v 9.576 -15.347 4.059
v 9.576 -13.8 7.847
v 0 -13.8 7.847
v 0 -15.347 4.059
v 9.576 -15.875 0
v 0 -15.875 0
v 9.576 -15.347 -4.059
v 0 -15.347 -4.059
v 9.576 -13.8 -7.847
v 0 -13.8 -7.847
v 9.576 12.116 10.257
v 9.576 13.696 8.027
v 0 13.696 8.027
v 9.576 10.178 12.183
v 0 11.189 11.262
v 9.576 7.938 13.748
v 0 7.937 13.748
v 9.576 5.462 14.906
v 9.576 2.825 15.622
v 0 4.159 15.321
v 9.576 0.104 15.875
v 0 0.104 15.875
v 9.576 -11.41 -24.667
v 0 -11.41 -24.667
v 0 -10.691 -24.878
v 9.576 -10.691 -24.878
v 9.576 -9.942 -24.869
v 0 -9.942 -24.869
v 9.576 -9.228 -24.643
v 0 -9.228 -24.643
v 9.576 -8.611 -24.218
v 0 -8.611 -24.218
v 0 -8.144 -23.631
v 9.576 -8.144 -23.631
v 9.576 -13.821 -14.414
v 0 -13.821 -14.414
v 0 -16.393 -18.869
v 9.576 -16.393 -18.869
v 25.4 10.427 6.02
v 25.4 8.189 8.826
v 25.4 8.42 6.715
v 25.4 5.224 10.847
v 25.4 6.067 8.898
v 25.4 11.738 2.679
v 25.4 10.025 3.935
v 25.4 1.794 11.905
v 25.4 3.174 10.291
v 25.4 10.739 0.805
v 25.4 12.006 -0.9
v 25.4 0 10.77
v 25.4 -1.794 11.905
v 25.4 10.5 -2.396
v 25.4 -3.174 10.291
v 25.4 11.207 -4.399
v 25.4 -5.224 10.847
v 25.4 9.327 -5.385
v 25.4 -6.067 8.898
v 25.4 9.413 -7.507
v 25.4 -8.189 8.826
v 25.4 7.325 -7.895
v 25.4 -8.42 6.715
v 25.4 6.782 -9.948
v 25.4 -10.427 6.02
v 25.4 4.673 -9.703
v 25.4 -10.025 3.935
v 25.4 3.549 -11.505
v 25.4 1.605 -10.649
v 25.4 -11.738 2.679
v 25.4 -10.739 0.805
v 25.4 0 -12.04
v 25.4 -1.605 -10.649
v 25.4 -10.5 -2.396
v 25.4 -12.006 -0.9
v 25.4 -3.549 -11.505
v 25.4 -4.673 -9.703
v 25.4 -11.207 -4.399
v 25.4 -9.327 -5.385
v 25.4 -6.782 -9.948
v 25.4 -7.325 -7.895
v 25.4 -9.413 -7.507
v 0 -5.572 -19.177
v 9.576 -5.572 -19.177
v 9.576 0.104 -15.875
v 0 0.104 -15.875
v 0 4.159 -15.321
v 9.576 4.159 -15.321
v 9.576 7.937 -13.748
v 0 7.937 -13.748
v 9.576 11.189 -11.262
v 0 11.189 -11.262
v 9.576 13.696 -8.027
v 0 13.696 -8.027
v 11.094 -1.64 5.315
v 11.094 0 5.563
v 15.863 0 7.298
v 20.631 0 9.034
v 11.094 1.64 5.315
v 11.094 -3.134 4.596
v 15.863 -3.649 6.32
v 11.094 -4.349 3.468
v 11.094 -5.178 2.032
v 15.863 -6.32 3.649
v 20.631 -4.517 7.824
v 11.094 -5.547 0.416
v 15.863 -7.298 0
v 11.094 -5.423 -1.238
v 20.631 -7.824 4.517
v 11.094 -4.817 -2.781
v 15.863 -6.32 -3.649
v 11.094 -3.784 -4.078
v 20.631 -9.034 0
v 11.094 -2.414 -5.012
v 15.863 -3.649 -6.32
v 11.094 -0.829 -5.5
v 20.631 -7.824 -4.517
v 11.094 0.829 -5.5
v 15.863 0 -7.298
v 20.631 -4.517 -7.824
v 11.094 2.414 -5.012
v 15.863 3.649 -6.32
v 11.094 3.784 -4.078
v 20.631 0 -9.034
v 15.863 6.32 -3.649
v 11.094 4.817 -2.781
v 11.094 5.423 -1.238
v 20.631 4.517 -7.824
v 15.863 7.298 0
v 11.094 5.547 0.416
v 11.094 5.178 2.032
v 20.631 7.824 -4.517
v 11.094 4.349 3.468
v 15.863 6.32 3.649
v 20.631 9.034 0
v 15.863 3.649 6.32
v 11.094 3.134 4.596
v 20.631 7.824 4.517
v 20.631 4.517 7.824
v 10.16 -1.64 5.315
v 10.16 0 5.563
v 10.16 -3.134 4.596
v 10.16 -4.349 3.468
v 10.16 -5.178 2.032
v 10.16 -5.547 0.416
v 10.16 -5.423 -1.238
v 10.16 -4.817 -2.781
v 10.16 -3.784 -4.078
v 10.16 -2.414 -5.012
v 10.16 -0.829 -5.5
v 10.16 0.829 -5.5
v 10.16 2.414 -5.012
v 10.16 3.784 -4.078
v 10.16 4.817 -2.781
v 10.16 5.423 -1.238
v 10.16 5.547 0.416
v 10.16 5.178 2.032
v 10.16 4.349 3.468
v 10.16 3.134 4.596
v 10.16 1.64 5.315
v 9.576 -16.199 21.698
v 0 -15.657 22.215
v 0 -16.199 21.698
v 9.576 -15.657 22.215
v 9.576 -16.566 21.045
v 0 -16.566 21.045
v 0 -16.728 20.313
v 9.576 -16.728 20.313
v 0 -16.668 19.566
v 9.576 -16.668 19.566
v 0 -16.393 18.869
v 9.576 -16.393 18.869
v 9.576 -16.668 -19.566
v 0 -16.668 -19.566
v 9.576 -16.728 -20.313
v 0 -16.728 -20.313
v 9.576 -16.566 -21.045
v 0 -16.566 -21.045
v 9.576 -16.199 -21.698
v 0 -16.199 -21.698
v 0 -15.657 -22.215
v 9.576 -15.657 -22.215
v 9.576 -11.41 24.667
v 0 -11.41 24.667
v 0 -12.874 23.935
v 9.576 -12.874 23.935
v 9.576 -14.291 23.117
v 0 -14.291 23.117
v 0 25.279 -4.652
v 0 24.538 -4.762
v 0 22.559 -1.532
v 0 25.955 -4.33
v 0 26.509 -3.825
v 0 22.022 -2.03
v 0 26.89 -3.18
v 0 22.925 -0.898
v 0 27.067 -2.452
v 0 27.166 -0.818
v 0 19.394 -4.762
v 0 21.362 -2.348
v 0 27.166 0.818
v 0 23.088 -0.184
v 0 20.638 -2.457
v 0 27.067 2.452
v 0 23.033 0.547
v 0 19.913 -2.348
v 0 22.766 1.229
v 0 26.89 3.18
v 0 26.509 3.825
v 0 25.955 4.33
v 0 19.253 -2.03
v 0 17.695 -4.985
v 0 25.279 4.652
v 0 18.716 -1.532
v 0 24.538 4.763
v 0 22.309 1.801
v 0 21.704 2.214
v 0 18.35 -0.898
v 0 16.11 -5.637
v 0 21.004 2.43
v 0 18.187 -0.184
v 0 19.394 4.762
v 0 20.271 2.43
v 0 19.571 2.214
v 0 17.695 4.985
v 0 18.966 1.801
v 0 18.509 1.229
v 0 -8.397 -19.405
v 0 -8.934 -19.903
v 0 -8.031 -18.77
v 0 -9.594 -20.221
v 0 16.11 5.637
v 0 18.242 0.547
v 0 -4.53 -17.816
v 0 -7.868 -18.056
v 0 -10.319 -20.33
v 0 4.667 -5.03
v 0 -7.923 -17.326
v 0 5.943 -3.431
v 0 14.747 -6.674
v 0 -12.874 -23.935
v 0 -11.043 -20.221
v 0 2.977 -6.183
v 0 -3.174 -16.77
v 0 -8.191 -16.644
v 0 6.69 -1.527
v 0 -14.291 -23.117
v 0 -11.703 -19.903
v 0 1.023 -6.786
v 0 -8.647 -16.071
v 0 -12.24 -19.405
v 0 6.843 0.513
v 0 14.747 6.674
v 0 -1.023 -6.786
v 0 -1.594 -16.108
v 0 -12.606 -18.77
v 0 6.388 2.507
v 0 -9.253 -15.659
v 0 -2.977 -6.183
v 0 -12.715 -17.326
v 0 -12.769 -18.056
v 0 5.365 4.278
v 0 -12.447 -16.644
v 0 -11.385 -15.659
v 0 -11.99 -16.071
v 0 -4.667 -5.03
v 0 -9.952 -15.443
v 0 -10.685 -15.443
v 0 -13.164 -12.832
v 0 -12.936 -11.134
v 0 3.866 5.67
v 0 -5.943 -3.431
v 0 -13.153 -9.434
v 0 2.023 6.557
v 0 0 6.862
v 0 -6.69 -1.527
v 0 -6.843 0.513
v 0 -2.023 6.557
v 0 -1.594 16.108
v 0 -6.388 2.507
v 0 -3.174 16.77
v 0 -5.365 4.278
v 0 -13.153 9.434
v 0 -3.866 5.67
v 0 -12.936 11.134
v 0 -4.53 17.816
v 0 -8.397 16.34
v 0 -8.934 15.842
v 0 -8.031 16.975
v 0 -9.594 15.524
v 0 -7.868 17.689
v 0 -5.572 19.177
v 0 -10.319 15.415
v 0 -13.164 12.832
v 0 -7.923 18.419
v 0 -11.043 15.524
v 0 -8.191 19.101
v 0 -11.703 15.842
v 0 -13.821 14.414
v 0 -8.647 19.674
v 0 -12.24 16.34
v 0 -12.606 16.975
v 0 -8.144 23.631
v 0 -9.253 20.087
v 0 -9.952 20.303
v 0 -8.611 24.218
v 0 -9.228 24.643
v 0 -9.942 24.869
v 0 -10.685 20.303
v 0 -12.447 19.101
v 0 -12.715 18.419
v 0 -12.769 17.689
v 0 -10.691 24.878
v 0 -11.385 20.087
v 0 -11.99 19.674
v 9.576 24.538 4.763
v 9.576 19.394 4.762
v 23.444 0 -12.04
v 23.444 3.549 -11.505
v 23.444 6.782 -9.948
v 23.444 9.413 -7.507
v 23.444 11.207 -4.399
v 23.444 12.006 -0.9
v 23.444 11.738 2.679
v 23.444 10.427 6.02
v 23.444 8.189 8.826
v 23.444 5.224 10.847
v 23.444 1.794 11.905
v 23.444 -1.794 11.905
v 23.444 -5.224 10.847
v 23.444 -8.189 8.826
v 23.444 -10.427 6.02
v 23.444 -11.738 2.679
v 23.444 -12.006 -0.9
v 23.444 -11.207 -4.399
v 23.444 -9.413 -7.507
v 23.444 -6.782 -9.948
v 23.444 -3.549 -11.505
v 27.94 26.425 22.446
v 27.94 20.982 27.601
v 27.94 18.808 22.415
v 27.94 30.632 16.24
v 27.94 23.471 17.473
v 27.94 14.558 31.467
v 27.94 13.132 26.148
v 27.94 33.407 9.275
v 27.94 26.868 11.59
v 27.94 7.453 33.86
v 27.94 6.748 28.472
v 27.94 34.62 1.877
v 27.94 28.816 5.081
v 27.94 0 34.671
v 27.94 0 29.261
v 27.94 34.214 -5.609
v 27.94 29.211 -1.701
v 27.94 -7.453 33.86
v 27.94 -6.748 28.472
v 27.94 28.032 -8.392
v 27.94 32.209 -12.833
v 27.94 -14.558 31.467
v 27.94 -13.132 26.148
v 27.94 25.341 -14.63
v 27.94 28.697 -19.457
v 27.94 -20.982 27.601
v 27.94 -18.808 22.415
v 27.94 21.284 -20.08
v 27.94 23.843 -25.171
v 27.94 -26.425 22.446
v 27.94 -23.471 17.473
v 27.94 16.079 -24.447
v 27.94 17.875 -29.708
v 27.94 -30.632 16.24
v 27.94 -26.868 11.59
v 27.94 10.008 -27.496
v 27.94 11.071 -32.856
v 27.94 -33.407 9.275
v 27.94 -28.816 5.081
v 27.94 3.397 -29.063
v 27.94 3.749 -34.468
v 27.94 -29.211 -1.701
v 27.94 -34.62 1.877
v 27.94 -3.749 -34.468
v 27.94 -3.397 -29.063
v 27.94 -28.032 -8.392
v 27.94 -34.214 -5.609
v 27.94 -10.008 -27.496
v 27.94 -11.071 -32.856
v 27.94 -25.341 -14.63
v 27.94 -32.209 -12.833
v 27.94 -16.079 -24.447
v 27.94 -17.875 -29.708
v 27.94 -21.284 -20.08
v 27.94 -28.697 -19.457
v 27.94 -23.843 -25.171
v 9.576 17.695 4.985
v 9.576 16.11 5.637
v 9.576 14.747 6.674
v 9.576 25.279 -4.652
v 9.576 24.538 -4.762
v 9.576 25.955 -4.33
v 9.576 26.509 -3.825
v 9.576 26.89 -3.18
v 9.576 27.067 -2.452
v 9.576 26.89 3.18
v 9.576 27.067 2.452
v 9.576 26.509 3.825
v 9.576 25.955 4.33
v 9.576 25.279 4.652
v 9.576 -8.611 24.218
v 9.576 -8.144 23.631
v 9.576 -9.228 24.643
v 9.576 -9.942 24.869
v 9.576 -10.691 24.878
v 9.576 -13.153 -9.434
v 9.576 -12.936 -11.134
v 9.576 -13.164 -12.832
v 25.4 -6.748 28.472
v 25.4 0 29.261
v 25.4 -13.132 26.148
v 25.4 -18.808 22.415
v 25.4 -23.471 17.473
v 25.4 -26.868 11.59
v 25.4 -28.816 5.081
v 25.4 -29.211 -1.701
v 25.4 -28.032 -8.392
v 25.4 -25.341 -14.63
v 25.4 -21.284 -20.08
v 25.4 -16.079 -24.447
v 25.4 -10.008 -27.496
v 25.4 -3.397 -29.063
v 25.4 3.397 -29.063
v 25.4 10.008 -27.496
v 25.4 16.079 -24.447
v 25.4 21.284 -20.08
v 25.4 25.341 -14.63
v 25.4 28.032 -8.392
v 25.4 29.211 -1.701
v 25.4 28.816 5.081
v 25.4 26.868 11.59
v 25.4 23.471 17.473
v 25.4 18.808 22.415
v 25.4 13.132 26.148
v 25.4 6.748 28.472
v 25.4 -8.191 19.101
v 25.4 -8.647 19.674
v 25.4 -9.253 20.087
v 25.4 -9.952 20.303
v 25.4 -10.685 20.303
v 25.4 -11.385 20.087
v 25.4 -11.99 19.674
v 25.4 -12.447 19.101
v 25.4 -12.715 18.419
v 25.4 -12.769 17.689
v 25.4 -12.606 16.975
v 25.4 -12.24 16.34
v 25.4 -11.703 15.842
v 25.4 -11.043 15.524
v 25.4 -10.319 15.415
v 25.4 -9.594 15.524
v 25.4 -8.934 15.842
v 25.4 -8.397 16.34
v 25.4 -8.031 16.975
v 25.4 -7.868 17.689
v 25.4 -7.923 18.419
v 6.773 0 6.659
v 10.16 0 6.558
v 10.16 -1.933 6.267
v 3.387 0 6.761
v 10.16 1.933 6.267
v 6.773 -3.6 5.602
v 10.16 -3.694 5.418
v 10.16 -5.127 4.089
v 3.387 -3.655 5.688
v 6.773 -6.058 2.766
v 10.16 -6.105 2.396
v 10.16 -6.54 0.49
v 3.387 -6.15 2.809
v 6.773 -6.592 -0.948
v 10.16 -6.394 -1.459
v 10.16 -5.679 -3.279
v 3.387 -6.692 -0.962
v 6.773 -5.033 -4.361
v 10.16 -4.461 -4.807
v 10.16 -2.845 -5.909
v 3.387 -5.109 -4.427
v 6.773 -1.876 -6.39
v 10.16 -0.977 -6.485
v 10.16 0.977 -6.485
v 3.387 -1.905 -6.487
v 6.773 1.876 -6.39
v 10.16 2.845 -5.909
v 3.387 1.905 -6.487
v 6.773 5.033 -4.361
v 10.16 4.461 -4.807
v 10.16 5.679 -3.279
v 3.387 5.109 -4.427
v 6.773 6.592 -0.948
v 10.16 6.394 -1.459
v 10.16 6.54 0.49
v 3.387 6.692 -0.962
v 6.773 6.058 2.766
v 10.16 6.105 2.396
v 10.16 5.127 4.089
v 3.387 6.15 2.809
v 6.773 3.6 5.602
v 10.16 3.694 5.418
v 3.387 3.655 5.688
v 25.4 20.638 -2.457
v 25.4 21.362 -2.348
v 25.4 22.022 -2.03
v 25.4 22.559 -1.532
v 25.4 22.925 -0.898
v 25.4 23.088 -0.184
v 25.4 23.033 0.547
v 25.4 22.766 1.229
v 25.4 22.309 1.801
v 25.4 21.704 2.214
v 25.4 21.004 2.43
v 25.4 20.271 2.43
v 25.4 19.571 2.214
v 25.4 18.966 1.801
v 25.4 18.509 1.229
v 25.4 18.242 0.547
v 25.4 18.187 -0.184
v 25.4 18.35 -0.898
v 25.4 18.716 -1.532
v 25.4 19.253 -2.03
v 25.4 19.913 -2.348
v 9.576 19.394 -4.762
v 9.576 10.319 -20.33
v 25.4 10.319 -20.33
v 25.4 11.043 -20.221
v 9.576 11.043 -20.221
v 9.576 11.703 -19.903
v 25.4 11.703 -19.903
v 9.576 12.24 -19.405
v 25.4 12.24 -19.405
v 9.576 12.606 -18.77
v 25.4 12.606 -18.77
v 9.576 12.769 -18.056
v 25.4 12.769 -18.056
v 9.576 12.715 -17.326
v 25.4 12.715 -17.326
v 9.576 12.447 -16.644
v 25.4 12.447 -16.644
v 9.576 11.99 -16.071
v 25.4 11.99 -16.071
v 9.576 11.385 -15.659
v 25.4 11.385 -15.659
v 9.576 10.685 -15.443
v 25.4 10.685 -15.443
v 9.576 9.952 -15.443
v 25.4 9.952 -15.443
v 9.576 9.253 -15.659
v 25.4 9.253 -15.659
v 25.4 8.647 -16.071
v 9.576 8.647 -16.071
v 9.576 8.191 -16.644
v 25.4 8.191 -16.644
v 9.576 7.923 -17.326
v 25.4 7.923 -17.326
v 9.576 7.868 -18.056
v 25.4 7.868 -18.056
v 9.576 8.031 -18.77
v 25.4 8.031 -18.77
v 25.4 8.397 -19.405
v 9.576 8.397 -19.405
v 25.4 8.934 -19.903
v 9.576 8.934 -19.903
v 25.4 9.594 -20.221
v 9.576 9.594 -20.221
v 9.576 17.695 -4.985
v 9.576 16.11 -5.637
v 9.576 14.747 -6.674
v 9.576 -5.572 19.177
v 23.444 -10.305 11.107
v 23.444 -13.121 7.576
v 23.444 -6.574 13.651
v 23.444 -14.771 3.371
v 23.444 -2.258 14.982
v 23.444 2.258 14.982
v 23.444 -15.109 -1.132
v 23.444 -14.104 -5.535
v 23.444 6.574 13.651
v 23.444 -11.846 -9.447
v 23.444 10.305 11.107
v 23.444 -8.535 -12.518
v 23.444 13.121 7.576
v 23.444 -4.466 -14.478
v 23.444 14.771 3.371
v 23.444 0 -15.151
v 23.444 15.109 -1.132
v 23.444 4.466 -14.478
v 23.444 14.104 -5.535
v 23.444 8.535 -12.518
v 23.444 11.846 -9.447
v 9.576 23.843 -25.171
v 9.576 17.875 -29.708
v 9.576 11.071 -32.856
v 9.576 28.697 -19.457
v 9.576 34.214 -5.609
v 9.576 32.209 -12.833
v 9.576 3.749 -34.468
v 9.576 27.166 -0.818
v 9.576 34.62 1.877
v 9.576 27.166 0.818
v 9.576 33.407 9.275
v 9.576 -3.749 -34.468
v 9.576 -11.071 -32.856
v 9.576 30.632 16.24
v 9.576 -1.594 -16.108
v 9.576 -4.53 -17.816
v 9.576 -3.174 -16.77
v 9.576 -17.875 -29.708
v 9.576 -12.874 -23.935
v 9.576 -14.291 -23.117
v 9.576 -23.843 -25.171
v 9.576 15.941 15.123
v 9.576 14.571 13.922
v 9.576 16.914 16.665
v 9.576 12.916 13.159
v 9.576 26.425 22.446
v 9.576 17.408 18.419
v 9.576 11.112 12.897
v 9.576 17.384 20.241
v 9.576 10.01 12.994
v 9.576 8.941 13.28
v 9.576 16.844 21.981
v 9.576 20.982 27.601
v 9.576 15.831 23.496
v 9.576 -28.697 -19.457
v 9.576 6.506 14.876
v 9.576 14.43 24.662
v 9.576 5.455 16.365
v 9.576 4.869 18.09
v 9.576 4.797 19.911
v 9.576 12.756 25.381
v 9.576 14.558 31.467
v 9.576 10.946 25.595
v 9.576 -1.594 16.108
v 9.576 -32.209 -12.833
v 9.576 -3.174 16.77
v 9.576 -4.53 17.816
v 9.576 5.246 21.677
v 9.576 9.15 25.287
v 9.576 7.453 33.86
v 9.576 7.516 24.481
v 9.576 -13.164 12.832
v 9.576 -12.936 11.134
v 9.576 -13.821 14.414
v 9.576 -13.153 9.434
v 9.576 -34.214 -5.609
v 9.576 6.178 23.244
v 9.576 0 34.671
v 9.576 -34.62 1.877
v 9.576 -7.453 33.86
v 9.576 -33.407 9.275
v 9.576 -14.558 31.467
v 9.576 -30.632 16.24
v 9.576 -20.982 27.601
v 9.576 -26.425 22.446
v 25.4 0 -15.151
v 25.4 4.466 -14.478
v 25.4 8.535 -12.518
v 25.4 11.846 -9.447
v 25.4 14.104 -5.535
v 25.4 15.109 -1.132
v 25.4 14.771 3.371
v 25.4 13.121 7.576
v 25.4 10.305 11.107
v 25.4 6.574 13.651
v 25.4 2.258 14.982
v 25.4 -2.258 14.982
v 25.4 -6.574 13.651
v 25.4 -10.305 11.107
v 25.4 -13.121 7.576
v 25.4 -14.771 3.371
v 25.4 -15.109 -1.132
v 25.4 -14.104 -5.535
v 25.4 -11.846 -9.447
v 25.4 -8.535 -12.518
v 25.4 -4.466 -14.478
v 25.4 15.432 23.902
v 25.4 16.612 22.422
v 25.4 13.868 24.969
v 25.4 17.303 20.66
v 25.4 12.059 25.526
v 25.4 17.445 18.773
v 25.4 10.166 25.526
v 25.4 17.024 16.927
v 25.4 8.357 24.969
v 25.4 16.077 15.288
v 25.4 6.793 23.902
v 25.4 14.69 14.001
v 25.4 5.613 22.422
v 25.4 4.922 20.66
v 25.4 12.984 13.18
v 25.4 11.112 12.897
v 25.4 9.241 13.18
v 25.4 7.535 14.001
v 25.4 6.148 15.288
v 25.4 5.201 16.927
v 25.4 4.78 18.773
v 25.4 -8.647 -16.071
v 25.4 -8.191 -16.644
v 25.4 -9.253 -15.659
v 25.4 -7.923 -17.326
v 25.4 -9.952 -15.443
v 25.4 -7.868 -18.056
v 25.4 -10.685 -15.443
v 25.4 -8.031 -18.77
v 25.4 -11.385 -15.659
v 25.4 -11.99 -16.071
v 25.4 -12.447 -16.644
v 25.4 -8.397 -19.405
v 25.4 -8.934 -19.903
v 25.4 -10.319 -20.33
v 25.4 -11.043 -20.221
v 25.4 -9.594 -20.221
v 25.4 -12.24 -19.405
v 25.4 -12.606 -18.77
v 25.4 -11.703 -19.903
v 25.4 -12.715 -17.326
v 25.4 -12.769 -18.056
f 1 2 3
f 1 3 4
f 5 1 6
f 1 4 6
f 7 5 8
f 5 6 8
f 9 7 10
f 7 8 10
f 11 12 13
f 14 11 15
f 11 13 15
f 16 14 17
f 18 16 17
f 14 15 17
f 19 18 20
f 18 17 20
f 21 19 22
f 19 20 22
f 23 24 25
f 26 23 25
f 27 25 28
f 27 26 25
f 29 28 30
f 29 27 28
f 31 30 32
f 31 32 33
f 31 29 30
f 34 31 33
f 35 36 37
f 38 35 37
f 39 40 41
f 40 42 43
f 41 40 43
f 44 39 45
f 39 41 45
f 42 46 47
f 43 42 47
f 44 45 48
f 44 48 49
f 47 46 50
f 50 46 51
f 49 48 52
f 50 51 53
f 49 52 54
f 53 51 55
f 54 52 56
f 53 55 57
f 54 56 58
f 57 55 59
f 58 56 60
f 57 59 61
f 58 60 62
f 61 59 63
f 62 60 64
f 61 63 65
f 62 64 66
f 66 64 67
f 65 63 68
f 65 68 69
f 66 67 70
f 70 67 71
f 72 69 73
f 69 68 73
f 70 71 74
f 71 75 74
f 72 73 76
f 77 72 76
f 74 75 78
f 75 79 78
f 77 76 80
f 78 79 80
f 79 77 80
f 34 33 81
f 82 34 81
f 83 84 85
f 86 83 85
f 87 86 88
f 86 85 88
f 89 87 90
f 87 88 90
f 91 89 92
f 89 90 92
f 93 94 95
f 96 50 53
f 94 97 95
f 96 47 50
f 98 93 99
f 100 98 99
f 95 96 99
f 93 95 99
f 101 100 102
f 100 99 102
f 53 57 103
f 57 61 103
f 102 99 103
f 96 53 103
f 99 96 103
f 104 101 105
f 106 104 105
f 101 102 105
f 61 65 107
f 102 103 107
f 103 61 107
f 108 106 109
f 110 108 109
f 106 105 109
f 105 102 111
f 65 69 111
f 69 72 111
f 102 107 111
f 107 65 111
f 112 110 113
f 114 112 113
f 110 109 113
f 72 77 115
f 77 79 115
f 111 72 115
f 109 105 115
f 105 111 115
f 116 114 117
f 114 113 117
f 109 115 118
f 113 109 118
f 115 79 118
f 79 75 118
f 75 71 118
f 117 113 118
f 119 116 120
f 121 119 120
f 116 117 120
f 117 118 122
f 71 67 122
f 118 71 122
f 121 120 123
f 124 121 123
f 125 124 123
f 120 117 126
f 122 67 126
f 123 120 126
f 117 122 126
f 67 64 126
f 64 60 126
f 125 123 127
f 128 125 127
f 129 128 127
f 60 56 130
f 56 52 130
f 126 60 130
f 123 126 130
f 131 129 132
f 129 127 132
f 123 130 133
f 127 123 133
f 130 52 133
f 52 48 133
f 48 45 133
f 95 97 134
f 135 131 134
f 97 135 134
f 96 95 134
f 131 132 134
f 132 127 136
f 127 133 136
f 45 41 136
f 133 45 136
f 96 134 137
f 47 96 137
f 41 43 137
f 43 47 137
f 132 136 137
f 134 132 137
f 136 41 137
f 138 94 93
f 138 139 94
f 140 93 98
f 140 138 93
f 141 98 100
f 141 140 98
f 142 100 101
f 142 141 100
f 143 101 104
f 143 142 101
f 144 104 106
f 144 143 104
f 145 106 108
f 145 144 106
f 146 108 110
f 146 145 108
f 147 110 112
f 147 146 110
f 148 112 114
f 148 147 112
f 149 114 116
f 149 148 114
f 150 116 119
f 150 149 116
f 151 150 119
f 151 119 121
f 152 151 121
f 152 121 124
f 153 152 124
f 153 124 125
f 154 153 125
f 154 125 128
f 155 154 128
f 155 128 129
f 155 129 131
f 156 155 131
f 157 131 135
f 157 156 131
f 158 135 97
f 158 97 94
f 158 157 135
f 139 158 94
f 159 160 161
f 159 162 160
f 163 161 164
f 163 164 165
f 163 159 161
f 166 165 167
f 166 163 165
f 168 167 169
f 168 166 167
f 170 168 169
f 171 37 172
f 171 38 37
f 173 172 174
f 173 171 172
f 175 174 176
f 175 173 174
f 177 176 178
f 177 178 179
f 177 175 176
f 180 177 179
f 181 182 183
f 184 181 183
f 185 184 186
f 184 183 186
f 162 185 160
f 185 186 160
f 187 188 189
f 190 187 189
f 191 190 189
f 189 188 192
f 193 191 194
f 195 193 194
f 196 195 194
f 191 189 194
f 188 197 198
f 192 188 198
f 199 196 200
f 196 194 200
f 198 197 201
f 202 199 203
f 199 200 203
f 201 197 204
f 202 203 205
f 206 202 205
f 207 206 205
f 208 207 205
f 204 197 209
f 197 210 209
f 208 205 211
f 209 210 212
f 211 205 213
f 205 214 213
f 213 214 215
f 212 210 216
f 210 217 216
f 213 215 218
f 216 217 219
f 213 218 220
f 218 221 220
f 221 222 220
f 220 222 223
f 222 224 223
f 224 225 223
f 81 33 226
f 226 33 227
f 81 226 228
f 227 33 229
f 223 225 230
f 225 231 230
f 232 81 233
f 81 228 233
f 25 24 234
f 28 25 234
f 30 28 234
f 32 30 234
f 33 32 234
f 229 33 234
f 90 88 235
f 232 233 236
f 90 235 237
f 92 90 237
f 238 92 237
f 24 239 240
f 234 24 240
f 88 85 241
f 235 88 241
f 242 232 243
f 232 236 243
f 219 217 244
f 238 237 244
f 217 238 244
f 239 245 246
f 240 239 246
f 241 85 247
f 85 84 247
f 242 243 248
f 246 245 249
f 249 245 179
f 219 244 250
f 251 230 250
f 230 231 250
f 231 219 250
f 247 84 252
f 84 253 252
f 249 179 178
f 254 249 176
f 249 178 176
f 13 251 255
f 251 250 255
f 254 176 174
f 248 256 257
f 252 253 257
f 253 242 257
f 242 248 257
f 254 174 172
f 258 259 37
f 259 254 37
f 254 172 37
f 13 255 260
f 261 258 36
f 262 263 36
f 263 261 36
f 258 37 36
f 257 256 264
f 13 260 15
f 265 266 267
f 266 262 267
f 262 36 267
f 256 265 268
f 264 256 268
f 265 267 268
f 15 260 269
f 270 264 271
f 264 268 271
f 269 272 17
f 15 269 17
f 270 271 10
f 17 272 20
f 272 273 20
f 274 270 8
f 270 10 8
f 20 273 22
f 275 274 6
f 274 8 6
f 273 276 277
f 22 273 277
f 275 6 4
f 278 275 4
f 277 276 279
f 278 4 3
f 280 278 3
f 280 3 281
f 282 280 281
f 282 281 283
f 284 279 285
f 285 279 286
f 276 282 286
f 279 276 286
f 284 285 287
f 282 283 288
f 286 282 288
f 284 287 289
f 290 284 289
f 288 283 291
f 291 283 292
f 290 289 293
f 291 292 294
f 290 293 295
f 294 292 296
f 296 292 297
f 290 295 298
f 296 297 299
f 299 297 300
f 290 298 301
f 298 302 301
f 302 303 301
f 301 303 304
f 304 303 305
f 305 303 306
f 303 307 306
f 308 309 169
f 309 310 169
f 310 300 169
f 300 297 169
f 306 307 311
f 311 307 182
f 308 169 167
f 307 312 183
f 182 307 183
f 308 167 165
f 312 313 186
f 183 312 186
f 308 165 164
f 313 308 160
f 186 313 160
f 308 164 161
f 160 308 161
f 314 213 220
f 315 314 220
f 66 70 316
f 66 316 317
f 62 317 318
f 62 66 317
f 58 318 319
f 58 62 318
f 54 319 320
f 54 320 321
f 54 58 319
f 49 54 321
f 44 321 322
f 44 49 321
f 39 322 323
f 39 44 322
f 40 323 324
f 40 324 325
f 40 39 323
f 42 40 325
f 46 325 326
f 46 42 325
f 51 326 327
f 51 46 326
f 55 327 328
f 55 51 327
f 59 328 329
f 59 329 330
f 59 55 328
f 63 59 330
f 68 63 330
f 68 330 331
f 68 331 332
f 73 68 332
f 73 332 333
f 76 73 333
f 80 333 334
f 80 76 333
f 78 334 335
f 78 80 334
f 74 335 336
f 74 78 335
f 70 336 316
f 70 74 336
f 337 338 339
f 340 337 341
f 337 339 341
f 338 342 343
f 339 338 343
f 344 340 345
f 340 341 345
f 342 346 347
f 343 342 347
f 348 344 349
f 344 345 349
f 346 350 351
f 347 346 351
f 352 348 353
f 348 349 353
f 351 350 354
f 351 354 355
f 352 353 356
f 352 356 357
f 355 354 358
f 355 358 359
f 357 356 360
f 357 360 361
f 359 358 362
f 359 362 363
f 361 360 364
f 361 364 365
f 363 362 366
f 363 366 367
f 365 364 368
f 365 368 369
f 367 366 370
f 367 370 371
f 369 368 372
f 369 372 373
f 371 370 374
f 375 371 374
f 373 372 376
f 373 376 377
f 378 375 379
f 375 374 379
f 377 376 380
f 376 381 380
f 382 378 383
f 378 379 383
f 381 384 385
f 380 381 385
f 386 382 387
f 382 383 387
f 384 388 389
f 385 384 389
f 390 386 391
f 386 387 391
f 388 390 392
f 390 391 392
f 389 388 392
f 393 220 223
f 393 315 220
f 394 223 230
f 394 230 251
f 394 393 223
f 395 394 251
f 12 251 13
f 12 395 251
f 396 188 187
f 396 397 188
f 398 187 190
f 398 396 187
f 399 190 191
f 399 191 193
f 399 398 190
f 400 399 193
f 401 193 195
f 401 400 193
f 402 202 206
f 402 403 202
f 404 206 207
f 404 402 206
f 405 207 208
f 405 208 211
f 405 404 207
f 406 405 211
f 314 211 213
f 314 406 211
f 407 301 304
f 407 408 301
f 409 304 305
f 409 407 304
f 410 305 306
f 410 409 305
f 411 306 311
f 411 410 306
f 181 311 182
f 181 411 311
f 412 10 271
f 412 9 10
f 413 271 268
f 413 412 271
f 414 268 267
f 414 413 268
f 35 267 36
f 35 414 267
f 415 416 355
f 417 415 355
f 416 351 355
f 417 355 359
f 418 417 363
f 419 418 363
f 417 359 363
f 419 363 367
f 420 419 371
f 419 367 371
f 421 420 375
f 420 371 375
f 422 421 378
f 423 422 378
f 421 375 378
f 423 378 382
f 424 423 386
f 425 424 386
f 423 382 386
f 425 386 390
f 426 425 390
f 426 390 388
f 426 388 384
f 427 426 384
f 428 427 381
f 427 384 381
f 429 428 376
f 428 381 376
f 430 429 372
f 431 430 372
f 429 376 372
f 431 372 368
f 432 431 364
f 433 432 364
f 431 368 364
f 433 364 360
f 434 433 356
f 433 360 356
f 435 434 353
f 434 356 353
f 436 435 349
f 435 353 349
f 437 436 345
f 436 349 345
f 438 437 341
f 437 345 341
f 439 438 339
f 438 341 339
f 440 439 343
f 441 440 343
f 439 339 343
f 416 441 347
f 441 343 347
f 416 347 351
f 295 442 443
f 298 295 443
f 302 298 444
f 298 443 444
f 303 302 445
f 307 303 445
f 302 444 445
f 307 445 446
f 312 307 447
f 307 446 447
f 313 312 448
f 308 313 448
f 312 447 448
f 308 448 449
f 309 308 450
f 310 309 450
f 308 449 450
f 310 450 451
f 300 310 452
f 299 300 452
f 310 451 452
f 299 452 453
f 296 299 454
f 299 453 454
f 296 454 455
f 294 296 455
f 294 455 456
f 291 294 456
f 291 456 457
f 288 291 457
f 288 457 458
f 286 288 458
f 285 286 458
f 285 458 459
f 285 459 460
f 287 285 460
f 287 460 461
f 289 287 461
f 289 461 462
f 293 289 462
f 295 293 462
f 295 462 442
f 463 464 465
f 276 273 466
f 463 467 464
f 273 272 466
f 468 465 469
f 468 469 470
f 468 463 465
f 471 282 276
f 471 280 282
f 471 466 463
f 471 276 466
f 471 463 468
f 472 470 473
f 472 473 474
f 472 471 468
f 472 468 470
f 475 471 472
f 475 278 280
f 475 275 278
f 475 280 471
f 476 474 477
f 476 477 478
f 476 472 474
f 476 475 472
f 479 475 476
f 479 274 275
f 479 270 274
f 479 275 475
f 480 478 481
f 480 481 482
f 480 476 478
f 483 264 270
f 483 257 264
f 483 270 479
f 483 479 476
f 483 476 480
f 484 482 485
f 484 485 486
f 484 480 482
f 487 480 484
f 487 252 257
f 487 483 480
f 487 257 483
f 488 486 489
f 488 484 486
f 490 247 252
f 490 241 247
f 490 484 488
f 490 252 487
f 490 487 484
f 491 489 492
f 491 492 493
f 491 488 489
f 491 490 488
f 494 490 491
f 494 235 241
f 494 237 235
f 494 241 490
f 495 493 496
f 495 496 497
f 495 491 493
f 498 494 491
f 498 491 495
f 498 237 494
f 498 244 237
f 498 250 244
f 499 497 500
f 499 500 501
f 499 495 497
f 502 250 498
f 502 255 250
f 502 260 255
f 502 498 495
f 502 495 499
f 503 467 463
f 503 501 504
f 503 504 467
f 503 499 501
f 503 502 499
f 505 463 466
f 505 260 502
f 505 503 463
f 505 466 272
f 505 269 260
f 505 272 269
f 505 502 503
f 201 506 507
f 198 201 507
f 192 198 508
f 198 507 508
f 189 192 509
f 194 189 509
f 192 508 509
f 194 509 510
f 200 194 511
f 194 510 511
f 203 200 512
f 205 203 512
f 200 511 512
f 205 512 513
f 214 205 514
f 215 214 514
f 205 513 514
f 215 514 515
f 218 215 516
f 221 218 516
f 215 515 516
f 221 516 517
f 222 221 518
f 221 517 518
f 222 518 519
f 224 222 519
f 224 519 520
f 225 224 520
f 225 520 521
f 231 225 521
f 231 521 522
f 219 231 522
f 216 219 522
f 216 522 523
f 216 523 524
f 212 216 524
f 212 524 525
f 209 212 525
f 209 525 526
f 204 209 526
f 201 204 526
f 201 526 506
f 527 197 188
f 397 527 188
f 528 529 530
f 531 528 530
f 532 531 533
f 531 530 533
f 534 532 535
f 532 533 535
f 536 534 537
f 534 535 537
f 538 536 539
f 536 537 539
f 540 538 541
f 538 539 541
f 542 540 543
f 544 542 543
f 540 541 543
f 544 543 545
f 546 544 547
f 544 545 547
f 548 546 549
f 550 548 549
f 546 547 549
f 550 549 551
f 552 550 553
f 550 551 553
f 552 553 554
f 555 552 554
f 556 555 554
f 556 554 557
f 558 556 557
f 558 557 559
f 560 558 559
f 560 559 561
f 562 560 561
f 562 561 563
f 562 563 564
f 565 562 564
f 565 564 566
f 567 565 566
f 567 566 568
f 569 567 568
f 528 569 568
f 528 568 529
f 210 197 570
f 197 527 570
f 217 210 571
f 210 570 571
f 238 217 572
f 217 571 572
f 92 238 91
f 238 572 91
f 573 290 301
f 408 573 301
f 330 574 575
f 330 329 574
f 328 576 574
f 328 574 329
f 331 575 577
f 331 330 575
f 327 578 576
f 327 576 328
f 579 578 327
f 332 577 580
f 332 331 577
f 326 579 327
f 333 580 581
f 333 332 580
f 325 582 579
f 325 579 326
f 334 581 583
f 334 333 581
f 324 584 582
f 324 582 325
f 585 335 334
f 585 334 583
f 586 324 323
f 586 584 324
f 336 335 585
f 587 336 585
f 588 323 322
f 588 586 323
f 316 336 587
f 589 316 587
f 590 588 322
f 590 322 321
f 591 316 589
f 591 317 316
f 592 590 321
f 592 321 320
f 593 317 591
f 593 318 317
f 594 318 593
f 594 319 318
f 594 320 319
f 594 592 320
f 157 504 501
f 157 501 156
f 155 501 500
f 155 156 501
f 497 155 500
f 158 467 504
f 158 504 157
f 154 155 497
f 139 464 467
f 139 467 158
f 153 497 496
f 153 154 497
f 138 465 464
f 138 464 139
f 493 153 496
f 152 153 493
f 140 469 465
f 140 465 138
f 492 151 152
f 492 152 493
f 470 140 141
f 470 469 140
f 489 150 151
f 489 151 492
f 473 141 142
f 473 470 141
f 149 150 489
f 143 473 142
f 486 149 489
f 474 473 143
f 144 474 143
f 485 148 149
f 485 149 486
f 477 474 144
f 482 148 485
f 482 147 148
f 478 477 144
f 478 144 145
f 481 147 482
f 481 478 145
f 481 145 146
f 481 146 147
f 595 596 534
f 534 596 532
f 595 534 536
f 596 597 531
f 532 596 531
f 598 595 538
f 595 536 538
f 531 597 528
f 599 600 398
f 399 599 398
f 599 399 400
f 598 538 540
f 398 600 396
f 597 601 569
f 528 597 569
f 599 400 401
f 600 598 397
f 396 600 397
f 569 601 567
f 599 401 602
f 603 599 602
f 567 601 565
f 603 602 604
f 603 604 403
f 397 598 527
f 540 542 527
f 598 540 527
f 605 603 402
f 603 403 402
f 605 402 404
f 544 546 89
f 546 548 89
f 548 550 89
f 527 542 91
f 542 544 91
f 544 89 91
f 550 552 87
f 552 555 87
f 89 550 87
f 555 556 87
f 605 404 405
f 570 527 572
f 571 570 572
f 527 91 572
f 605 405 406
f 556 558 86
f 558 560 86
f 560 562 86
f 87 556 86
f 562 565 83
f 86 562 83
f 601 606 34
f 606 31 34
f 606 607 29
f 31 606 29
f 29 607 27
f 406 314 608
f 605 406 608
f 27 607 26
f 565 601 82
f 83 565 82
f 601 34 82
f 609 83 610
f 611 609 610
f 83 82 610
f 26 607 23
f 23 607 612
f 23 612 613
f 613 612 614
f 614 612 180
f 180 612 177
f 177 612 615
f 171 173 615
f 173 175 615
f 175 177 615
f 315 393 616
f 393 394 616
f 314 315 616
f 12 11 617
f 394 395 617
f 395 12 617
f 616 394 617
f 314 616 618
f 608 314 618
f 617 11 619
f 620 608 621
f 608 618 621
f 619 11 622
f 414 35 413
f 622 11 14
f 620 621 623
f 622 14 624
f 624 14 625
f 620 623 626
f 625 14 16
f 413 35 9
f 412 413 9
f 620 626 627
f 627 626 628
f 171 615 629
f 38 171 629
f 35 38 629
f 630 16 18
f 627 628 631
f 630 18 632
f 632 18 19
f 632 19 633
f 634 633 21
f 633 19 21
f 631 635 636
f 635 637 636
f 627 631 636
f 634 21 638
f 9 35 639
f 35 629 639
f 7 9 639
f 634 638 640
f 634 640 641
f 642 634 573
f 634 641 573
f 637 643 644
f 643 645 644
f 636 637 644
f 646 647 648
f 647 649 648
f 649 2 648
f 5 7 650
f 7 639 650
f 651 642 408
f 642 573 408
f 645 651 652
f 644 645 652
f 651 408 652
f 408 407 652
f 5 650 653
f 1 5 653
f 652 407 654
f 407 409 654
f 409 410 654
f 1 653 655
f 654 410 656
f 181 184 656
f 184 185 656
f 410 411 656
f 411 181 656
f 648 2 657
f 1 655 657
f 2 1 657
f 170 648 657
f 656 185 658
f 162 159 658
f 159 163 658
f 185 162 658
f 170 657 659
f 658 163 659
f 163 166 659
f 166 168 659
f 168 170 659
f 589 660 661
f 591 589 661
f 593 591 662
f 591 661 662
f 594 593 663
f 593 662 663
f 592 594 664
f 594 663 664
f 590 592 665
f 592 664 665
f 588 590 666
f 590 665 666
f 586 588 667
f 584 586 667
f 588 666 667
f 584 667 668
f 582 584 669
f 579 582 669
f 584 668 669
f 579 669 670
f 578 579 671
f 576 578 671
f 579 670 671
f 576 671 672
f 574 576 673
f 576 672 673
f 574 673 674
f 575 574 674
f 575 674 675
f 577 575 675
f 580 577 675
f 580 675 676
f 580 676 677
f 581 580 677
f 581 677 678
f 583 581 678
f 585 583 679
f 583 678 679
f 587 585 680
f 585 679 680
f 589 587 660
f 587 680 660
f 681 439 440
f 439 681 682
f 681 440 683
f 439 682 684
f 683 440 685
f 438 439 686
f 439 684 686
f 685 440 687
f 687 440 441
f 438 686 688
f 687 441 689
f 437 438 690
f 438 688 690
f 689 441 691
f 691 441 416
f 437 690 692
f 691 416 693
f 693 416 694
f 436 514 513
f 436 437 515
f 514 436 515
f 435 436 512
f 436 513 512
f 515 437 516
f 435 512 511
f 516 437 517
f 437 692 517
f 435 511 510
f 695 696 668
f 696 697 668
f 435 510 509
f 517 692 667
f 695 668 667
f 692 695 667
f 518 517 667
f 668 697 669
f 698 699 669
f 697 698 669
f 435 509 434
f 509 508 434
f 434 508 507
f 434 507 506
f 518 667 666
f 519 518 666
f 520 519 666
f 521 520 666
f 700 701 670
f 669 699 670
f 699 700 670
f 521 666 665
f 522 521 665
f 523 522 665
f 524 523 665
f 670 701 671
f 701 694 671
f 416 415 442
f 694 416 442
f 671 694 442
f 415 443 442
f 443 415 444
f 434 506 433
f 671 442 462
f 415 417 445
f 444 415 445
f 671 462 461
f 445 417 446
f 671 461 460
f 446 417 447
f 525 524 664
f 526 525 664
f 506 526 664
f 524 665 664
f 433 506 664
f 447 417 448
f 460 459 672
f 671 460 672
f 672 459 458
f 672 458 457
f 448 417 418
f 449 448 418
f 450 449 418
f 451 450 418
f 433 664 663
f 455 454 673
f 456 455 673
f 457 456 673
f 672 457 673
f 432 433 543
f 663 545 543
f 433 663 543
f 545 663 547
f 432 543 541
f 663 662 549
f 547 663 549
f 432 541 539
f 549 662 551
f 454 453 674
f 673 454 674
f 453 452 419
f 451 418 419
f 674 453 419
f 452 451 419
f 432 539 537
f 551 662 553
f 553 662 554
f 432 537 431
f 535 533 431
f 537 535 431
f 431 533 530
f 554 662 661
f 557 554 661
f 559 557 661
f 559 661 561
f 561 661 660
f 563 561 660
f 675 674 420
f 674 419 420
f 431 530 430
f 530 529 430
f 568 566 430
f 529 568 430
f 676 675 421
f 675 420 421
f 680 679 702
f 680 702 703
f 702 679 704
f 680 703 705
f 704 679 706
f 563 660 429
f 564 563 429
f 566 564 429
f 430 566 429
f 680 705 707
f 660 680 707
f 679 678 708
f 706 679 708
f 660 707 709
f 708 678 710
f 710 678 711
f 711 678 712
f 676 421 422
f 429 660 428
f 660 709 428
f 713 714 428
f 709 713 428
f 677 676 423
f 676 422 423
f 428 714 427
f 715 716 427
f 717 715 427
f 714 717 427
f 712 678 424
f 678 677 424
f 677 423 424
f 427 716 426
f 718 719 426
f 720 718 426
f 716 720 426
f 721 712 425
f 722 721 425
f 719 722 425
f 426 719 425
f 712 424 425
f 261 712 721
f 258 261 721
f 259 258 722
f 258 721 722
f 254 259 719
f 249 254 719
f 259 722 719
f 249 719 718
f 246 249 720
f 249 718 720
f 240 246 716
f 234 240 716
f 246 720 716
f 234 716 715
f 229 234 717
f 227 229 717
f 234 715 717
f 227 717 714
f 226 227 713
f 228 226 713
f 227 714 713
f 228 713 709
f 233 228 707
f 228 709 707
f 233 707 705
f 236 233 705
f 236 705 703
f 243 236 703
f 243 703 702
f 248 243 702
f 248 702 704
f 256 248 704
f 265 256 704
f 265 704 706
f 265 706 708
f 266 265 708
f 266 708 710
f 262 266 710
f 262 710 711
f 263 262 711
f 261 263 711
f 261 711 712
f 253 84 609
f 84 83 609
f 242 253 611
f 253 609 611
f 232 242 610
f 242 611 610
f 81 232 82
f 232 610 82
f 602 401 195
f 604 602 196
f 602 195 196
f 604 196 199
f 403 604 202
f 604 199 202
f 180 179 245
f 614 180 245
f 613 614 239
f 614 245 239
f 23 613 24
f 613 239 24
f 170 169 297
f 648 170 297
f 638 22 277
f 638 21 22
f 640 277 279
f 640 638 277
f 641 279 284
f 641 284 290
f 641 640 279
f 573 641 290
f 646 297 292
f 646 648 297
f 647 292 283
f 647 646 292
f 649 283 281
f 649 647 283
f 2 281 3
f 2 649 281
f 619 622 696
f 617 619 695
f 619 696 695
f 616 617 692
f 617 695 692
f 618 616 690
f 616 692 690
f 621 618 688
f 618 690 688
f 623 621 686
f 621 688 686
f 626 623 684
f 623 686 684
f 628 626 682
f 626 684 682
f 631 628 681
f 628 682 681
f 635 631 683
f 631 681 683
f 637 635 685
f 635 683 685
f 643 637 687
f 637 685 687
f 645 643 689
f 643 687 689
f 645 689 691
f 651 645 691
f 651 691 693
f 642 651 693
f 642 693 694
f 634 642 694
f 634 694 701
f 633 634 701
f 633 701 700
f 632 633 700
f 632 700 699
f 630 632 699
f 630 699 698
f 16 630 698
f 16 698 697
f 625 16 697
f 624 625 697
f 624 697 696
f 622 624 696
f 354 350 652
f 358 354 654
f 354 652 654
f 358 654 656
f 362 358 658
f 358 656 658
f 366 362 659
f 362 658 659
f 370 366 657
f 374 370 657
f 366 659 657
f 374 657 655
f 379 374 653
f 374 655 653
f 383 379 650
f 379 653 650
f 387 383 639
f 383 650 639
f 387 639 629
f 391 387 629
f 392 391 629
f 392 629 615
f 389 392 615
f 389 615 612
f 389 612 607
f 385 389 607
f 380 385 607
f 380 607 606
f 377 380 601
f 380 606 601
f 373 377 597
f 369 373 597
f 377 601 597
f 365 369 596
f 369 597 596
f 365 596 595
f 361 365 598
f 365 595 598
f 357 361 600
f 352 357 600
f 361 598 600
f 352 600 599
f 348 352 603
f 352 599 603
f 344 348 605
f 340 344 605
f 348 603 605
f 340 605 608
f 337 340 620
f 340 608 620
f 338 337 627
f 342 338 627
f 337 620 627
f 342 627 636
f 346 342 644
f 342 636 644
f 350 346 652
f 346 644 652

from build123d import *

# Parameters (mm, degrees)
MOUNTING_HOLE_D               = 4.9149
CIRPATTERN1_COUNT             = 3
SKETCH26_R                    = 15.1511
SKETCH26_R_2                  = 12.0396
AXIAL_O_RING_GLAND_DEPTH      = 1.9558
PRESSURE_TAP_CLEARANCE_HOLE_D = 12.7
THERMOCOUPLE_CLEARANCE_HOLE_D = 4.9149
SKETCH7_R                     = 34.7345
CUT_EXTRUDE1_DEPTH            = 9.5758
FILLET1_R                     = 2.54
FILLET2_R                     = 6.604


with BuildPart() as part:
    # Sketch1 → Revolve2 (revolve)
    with BuildSketch(Plane.XY, mode=Mode.PRIVATE) as revolve2_sk:
        Polygon((27.94, 34.671), (9.5758, 34.671), (9.5758, 27.94), (0, 27.94), (0, 0), (25.4, 0), (25.4, 29.2608), (27.94, 29.2608), align=None)
    revolve(revolve2_sk.sketch.rotate(Axis((-88.99, 0, 0), (1, 0, 0)), 90), axis=Axis((-88.99, 0, 0), (1, 0, 0)))

    # Sketch28 → NPT Center Bore (revolve, cut)
    with BuildSketch(Plane.ZX):
        Polygon((0, 0), (0, 27.94), (5.5626, 27.94), (5.5626, 10.16), (6.557974294, 10.16), (6.8621783, 0), align=None)
    revolve(axis=Axis((-6.35, 0, 0), (1, 0, 0)), mode=Mode.SUBTRACT)

    # Mounting Hole (through all)
    with Locations(Plane.ZY):
        with Locations((0, 20.6375)):
            mounting_hole = Hole(MOUNTING_HOLE_D / 2)

    # CirPattern1: Mounting Hole ×3 about axis
    cirpattern1_axis = Axis((0, 0, 0), (1, 0, 0))
    for i in range(1, CIRPATTERN1_COUNT):
        add(mounting_hole.rotate(cirpattern1_axis, i * 360 / CIRPATTERN1_COUNT), mode=Mode.SUBTRACT)

    # Sketch26 → Axial O-Ring Gland (cut)
    with BuildSketch(Plane(origin=(25.4, 0, 0), x_dir=(0, 0, -1), z_dir=(1, 0, 0))):
        Circle(SKETCH26_R)
        Circle(SKETCH26_R_2, mode=Mode.SUBTRACT)
    extrude(amount=-AXIAL_O_RING_GLAND_DEPTH, mode=Mode.SUBTRACT)

    # Sketch30 → Flow Cone (revolve, cut)
    with BuildSketch(Plane.XY, mode=Mode.PRIVATE) as flow_cone_sk:
        Polygon((11.093885077, 5.5626), (25.4, 10.7696), (25.4, 5.5626), align=None)
    revolve(flow_cone_sk.sketch.rotate(Axis((-88.99, 0, 0), (1, 0, 0)), 90), axis=Axis((-88.99, 0, 0), (1, 0, 0)), mode=Mode.SUBTRACT)

    # Pressure Tap Clearance Hole (through all)
    with Locations(Plane.ZY):
        with Locations((19.247414599, 11.1125)):
            Hole(PRESSURE_TAP_CLEARANCE_HOLE_D / 2)

    # Thermocouple Clearance Hole (through all)
    with Locations(Plane.ZY):
        with Locations((-17.872599271, 10.31875)):
            Hole(THERMOCOUPLE_CLEARANCE_HOLE_D / 2)

    # Sketch7 → Cut-Extrude1 (cut)
    with BuildSketch(Plane.ZY):
        Circle(SKETCH7_R)
        with BuildLine():
            Line((15.496152366, -3.447446426), (25.553900006, -9.254289733))
            ThreePointArc((25.553900006, -9.254289733), (23.536838424, -13.589), (20.791400006, -17.503181704))
            Line((20.791400006, -17.503181704), (10.733652366, -11.696338397))
            ThreePointArc((10.733652366, -11.696338397), (0, -15.875), (-10.733652366, -11.696338397))
            Line((-10.733652366, -11.696338397), (-20.791400006, -17.503181704))
            ThreePointArc((-20.791400006, -17.503181704), (-23.536838424, -13.589), (-25.553900006, -9.254289733))
            Line((-25.553900006, -9.254289733), (-15.496152366, -3.447446426))
            ThreePointArc((-15.496152366, -3.447446426), (-13.748153285, 7.9375), (-4.7625, 15.143784822))
            Line((-4.7625, 15.143784822), (-4.7625, 26.757471438))
            ThreePointArc((-4.7625, 26.757471438), (0, 27.178), (4.7625, 26.757471438))
            Line((4.7625, 26.757471438), (4.7625, 15.143784822))
            ThreePointArc((4.7625, 15.143784822), (13.748153285, 7.9375), (15.496152366, -3.447446426))
        make_face(mode=Mode.SUBTRACT)
    extrude(amount=-CUT_EXTRUDE1_DEPTH, mode=Mode.SUBTRACT)

    # Fillet1
    fillet1_edges = [part.edges().sort_by_distance(p)[0] for p in [
        (4.7879, -9.254289733, 25.553900006),
        (4.7879, -17.503181704, 20.791400006),
        (4.7879, -17.503181704, -20.791400006),
        (4.7879, -9.254289733, -25.553900006),
        (4.7879, 26.757471438, -4.7625),
        (4.7879, 26.757471438, 4.7625),
    ]]
    fillet(fillet1_edges, radius=FILLET1_R)

    # Fillet2
    fillet2_edges = [part.edges().sort_by_distance(p)[0] for p in [
        (4.7879, -3.447446426, 15.496152366),
        (4.7879, -11.696338397, 10.733652366),
        (4.7879, -11.696338397, -10.733652366),
        (4.7879, -3.447446426, -15.496152366),
        (4.7879, 15.143784822, -4.7625),
        (4.7879, 15.143784822, 4.7625),
    ]]
    fillet(fillet2_edges, radius=FILLET2_R)


solid = part.part
